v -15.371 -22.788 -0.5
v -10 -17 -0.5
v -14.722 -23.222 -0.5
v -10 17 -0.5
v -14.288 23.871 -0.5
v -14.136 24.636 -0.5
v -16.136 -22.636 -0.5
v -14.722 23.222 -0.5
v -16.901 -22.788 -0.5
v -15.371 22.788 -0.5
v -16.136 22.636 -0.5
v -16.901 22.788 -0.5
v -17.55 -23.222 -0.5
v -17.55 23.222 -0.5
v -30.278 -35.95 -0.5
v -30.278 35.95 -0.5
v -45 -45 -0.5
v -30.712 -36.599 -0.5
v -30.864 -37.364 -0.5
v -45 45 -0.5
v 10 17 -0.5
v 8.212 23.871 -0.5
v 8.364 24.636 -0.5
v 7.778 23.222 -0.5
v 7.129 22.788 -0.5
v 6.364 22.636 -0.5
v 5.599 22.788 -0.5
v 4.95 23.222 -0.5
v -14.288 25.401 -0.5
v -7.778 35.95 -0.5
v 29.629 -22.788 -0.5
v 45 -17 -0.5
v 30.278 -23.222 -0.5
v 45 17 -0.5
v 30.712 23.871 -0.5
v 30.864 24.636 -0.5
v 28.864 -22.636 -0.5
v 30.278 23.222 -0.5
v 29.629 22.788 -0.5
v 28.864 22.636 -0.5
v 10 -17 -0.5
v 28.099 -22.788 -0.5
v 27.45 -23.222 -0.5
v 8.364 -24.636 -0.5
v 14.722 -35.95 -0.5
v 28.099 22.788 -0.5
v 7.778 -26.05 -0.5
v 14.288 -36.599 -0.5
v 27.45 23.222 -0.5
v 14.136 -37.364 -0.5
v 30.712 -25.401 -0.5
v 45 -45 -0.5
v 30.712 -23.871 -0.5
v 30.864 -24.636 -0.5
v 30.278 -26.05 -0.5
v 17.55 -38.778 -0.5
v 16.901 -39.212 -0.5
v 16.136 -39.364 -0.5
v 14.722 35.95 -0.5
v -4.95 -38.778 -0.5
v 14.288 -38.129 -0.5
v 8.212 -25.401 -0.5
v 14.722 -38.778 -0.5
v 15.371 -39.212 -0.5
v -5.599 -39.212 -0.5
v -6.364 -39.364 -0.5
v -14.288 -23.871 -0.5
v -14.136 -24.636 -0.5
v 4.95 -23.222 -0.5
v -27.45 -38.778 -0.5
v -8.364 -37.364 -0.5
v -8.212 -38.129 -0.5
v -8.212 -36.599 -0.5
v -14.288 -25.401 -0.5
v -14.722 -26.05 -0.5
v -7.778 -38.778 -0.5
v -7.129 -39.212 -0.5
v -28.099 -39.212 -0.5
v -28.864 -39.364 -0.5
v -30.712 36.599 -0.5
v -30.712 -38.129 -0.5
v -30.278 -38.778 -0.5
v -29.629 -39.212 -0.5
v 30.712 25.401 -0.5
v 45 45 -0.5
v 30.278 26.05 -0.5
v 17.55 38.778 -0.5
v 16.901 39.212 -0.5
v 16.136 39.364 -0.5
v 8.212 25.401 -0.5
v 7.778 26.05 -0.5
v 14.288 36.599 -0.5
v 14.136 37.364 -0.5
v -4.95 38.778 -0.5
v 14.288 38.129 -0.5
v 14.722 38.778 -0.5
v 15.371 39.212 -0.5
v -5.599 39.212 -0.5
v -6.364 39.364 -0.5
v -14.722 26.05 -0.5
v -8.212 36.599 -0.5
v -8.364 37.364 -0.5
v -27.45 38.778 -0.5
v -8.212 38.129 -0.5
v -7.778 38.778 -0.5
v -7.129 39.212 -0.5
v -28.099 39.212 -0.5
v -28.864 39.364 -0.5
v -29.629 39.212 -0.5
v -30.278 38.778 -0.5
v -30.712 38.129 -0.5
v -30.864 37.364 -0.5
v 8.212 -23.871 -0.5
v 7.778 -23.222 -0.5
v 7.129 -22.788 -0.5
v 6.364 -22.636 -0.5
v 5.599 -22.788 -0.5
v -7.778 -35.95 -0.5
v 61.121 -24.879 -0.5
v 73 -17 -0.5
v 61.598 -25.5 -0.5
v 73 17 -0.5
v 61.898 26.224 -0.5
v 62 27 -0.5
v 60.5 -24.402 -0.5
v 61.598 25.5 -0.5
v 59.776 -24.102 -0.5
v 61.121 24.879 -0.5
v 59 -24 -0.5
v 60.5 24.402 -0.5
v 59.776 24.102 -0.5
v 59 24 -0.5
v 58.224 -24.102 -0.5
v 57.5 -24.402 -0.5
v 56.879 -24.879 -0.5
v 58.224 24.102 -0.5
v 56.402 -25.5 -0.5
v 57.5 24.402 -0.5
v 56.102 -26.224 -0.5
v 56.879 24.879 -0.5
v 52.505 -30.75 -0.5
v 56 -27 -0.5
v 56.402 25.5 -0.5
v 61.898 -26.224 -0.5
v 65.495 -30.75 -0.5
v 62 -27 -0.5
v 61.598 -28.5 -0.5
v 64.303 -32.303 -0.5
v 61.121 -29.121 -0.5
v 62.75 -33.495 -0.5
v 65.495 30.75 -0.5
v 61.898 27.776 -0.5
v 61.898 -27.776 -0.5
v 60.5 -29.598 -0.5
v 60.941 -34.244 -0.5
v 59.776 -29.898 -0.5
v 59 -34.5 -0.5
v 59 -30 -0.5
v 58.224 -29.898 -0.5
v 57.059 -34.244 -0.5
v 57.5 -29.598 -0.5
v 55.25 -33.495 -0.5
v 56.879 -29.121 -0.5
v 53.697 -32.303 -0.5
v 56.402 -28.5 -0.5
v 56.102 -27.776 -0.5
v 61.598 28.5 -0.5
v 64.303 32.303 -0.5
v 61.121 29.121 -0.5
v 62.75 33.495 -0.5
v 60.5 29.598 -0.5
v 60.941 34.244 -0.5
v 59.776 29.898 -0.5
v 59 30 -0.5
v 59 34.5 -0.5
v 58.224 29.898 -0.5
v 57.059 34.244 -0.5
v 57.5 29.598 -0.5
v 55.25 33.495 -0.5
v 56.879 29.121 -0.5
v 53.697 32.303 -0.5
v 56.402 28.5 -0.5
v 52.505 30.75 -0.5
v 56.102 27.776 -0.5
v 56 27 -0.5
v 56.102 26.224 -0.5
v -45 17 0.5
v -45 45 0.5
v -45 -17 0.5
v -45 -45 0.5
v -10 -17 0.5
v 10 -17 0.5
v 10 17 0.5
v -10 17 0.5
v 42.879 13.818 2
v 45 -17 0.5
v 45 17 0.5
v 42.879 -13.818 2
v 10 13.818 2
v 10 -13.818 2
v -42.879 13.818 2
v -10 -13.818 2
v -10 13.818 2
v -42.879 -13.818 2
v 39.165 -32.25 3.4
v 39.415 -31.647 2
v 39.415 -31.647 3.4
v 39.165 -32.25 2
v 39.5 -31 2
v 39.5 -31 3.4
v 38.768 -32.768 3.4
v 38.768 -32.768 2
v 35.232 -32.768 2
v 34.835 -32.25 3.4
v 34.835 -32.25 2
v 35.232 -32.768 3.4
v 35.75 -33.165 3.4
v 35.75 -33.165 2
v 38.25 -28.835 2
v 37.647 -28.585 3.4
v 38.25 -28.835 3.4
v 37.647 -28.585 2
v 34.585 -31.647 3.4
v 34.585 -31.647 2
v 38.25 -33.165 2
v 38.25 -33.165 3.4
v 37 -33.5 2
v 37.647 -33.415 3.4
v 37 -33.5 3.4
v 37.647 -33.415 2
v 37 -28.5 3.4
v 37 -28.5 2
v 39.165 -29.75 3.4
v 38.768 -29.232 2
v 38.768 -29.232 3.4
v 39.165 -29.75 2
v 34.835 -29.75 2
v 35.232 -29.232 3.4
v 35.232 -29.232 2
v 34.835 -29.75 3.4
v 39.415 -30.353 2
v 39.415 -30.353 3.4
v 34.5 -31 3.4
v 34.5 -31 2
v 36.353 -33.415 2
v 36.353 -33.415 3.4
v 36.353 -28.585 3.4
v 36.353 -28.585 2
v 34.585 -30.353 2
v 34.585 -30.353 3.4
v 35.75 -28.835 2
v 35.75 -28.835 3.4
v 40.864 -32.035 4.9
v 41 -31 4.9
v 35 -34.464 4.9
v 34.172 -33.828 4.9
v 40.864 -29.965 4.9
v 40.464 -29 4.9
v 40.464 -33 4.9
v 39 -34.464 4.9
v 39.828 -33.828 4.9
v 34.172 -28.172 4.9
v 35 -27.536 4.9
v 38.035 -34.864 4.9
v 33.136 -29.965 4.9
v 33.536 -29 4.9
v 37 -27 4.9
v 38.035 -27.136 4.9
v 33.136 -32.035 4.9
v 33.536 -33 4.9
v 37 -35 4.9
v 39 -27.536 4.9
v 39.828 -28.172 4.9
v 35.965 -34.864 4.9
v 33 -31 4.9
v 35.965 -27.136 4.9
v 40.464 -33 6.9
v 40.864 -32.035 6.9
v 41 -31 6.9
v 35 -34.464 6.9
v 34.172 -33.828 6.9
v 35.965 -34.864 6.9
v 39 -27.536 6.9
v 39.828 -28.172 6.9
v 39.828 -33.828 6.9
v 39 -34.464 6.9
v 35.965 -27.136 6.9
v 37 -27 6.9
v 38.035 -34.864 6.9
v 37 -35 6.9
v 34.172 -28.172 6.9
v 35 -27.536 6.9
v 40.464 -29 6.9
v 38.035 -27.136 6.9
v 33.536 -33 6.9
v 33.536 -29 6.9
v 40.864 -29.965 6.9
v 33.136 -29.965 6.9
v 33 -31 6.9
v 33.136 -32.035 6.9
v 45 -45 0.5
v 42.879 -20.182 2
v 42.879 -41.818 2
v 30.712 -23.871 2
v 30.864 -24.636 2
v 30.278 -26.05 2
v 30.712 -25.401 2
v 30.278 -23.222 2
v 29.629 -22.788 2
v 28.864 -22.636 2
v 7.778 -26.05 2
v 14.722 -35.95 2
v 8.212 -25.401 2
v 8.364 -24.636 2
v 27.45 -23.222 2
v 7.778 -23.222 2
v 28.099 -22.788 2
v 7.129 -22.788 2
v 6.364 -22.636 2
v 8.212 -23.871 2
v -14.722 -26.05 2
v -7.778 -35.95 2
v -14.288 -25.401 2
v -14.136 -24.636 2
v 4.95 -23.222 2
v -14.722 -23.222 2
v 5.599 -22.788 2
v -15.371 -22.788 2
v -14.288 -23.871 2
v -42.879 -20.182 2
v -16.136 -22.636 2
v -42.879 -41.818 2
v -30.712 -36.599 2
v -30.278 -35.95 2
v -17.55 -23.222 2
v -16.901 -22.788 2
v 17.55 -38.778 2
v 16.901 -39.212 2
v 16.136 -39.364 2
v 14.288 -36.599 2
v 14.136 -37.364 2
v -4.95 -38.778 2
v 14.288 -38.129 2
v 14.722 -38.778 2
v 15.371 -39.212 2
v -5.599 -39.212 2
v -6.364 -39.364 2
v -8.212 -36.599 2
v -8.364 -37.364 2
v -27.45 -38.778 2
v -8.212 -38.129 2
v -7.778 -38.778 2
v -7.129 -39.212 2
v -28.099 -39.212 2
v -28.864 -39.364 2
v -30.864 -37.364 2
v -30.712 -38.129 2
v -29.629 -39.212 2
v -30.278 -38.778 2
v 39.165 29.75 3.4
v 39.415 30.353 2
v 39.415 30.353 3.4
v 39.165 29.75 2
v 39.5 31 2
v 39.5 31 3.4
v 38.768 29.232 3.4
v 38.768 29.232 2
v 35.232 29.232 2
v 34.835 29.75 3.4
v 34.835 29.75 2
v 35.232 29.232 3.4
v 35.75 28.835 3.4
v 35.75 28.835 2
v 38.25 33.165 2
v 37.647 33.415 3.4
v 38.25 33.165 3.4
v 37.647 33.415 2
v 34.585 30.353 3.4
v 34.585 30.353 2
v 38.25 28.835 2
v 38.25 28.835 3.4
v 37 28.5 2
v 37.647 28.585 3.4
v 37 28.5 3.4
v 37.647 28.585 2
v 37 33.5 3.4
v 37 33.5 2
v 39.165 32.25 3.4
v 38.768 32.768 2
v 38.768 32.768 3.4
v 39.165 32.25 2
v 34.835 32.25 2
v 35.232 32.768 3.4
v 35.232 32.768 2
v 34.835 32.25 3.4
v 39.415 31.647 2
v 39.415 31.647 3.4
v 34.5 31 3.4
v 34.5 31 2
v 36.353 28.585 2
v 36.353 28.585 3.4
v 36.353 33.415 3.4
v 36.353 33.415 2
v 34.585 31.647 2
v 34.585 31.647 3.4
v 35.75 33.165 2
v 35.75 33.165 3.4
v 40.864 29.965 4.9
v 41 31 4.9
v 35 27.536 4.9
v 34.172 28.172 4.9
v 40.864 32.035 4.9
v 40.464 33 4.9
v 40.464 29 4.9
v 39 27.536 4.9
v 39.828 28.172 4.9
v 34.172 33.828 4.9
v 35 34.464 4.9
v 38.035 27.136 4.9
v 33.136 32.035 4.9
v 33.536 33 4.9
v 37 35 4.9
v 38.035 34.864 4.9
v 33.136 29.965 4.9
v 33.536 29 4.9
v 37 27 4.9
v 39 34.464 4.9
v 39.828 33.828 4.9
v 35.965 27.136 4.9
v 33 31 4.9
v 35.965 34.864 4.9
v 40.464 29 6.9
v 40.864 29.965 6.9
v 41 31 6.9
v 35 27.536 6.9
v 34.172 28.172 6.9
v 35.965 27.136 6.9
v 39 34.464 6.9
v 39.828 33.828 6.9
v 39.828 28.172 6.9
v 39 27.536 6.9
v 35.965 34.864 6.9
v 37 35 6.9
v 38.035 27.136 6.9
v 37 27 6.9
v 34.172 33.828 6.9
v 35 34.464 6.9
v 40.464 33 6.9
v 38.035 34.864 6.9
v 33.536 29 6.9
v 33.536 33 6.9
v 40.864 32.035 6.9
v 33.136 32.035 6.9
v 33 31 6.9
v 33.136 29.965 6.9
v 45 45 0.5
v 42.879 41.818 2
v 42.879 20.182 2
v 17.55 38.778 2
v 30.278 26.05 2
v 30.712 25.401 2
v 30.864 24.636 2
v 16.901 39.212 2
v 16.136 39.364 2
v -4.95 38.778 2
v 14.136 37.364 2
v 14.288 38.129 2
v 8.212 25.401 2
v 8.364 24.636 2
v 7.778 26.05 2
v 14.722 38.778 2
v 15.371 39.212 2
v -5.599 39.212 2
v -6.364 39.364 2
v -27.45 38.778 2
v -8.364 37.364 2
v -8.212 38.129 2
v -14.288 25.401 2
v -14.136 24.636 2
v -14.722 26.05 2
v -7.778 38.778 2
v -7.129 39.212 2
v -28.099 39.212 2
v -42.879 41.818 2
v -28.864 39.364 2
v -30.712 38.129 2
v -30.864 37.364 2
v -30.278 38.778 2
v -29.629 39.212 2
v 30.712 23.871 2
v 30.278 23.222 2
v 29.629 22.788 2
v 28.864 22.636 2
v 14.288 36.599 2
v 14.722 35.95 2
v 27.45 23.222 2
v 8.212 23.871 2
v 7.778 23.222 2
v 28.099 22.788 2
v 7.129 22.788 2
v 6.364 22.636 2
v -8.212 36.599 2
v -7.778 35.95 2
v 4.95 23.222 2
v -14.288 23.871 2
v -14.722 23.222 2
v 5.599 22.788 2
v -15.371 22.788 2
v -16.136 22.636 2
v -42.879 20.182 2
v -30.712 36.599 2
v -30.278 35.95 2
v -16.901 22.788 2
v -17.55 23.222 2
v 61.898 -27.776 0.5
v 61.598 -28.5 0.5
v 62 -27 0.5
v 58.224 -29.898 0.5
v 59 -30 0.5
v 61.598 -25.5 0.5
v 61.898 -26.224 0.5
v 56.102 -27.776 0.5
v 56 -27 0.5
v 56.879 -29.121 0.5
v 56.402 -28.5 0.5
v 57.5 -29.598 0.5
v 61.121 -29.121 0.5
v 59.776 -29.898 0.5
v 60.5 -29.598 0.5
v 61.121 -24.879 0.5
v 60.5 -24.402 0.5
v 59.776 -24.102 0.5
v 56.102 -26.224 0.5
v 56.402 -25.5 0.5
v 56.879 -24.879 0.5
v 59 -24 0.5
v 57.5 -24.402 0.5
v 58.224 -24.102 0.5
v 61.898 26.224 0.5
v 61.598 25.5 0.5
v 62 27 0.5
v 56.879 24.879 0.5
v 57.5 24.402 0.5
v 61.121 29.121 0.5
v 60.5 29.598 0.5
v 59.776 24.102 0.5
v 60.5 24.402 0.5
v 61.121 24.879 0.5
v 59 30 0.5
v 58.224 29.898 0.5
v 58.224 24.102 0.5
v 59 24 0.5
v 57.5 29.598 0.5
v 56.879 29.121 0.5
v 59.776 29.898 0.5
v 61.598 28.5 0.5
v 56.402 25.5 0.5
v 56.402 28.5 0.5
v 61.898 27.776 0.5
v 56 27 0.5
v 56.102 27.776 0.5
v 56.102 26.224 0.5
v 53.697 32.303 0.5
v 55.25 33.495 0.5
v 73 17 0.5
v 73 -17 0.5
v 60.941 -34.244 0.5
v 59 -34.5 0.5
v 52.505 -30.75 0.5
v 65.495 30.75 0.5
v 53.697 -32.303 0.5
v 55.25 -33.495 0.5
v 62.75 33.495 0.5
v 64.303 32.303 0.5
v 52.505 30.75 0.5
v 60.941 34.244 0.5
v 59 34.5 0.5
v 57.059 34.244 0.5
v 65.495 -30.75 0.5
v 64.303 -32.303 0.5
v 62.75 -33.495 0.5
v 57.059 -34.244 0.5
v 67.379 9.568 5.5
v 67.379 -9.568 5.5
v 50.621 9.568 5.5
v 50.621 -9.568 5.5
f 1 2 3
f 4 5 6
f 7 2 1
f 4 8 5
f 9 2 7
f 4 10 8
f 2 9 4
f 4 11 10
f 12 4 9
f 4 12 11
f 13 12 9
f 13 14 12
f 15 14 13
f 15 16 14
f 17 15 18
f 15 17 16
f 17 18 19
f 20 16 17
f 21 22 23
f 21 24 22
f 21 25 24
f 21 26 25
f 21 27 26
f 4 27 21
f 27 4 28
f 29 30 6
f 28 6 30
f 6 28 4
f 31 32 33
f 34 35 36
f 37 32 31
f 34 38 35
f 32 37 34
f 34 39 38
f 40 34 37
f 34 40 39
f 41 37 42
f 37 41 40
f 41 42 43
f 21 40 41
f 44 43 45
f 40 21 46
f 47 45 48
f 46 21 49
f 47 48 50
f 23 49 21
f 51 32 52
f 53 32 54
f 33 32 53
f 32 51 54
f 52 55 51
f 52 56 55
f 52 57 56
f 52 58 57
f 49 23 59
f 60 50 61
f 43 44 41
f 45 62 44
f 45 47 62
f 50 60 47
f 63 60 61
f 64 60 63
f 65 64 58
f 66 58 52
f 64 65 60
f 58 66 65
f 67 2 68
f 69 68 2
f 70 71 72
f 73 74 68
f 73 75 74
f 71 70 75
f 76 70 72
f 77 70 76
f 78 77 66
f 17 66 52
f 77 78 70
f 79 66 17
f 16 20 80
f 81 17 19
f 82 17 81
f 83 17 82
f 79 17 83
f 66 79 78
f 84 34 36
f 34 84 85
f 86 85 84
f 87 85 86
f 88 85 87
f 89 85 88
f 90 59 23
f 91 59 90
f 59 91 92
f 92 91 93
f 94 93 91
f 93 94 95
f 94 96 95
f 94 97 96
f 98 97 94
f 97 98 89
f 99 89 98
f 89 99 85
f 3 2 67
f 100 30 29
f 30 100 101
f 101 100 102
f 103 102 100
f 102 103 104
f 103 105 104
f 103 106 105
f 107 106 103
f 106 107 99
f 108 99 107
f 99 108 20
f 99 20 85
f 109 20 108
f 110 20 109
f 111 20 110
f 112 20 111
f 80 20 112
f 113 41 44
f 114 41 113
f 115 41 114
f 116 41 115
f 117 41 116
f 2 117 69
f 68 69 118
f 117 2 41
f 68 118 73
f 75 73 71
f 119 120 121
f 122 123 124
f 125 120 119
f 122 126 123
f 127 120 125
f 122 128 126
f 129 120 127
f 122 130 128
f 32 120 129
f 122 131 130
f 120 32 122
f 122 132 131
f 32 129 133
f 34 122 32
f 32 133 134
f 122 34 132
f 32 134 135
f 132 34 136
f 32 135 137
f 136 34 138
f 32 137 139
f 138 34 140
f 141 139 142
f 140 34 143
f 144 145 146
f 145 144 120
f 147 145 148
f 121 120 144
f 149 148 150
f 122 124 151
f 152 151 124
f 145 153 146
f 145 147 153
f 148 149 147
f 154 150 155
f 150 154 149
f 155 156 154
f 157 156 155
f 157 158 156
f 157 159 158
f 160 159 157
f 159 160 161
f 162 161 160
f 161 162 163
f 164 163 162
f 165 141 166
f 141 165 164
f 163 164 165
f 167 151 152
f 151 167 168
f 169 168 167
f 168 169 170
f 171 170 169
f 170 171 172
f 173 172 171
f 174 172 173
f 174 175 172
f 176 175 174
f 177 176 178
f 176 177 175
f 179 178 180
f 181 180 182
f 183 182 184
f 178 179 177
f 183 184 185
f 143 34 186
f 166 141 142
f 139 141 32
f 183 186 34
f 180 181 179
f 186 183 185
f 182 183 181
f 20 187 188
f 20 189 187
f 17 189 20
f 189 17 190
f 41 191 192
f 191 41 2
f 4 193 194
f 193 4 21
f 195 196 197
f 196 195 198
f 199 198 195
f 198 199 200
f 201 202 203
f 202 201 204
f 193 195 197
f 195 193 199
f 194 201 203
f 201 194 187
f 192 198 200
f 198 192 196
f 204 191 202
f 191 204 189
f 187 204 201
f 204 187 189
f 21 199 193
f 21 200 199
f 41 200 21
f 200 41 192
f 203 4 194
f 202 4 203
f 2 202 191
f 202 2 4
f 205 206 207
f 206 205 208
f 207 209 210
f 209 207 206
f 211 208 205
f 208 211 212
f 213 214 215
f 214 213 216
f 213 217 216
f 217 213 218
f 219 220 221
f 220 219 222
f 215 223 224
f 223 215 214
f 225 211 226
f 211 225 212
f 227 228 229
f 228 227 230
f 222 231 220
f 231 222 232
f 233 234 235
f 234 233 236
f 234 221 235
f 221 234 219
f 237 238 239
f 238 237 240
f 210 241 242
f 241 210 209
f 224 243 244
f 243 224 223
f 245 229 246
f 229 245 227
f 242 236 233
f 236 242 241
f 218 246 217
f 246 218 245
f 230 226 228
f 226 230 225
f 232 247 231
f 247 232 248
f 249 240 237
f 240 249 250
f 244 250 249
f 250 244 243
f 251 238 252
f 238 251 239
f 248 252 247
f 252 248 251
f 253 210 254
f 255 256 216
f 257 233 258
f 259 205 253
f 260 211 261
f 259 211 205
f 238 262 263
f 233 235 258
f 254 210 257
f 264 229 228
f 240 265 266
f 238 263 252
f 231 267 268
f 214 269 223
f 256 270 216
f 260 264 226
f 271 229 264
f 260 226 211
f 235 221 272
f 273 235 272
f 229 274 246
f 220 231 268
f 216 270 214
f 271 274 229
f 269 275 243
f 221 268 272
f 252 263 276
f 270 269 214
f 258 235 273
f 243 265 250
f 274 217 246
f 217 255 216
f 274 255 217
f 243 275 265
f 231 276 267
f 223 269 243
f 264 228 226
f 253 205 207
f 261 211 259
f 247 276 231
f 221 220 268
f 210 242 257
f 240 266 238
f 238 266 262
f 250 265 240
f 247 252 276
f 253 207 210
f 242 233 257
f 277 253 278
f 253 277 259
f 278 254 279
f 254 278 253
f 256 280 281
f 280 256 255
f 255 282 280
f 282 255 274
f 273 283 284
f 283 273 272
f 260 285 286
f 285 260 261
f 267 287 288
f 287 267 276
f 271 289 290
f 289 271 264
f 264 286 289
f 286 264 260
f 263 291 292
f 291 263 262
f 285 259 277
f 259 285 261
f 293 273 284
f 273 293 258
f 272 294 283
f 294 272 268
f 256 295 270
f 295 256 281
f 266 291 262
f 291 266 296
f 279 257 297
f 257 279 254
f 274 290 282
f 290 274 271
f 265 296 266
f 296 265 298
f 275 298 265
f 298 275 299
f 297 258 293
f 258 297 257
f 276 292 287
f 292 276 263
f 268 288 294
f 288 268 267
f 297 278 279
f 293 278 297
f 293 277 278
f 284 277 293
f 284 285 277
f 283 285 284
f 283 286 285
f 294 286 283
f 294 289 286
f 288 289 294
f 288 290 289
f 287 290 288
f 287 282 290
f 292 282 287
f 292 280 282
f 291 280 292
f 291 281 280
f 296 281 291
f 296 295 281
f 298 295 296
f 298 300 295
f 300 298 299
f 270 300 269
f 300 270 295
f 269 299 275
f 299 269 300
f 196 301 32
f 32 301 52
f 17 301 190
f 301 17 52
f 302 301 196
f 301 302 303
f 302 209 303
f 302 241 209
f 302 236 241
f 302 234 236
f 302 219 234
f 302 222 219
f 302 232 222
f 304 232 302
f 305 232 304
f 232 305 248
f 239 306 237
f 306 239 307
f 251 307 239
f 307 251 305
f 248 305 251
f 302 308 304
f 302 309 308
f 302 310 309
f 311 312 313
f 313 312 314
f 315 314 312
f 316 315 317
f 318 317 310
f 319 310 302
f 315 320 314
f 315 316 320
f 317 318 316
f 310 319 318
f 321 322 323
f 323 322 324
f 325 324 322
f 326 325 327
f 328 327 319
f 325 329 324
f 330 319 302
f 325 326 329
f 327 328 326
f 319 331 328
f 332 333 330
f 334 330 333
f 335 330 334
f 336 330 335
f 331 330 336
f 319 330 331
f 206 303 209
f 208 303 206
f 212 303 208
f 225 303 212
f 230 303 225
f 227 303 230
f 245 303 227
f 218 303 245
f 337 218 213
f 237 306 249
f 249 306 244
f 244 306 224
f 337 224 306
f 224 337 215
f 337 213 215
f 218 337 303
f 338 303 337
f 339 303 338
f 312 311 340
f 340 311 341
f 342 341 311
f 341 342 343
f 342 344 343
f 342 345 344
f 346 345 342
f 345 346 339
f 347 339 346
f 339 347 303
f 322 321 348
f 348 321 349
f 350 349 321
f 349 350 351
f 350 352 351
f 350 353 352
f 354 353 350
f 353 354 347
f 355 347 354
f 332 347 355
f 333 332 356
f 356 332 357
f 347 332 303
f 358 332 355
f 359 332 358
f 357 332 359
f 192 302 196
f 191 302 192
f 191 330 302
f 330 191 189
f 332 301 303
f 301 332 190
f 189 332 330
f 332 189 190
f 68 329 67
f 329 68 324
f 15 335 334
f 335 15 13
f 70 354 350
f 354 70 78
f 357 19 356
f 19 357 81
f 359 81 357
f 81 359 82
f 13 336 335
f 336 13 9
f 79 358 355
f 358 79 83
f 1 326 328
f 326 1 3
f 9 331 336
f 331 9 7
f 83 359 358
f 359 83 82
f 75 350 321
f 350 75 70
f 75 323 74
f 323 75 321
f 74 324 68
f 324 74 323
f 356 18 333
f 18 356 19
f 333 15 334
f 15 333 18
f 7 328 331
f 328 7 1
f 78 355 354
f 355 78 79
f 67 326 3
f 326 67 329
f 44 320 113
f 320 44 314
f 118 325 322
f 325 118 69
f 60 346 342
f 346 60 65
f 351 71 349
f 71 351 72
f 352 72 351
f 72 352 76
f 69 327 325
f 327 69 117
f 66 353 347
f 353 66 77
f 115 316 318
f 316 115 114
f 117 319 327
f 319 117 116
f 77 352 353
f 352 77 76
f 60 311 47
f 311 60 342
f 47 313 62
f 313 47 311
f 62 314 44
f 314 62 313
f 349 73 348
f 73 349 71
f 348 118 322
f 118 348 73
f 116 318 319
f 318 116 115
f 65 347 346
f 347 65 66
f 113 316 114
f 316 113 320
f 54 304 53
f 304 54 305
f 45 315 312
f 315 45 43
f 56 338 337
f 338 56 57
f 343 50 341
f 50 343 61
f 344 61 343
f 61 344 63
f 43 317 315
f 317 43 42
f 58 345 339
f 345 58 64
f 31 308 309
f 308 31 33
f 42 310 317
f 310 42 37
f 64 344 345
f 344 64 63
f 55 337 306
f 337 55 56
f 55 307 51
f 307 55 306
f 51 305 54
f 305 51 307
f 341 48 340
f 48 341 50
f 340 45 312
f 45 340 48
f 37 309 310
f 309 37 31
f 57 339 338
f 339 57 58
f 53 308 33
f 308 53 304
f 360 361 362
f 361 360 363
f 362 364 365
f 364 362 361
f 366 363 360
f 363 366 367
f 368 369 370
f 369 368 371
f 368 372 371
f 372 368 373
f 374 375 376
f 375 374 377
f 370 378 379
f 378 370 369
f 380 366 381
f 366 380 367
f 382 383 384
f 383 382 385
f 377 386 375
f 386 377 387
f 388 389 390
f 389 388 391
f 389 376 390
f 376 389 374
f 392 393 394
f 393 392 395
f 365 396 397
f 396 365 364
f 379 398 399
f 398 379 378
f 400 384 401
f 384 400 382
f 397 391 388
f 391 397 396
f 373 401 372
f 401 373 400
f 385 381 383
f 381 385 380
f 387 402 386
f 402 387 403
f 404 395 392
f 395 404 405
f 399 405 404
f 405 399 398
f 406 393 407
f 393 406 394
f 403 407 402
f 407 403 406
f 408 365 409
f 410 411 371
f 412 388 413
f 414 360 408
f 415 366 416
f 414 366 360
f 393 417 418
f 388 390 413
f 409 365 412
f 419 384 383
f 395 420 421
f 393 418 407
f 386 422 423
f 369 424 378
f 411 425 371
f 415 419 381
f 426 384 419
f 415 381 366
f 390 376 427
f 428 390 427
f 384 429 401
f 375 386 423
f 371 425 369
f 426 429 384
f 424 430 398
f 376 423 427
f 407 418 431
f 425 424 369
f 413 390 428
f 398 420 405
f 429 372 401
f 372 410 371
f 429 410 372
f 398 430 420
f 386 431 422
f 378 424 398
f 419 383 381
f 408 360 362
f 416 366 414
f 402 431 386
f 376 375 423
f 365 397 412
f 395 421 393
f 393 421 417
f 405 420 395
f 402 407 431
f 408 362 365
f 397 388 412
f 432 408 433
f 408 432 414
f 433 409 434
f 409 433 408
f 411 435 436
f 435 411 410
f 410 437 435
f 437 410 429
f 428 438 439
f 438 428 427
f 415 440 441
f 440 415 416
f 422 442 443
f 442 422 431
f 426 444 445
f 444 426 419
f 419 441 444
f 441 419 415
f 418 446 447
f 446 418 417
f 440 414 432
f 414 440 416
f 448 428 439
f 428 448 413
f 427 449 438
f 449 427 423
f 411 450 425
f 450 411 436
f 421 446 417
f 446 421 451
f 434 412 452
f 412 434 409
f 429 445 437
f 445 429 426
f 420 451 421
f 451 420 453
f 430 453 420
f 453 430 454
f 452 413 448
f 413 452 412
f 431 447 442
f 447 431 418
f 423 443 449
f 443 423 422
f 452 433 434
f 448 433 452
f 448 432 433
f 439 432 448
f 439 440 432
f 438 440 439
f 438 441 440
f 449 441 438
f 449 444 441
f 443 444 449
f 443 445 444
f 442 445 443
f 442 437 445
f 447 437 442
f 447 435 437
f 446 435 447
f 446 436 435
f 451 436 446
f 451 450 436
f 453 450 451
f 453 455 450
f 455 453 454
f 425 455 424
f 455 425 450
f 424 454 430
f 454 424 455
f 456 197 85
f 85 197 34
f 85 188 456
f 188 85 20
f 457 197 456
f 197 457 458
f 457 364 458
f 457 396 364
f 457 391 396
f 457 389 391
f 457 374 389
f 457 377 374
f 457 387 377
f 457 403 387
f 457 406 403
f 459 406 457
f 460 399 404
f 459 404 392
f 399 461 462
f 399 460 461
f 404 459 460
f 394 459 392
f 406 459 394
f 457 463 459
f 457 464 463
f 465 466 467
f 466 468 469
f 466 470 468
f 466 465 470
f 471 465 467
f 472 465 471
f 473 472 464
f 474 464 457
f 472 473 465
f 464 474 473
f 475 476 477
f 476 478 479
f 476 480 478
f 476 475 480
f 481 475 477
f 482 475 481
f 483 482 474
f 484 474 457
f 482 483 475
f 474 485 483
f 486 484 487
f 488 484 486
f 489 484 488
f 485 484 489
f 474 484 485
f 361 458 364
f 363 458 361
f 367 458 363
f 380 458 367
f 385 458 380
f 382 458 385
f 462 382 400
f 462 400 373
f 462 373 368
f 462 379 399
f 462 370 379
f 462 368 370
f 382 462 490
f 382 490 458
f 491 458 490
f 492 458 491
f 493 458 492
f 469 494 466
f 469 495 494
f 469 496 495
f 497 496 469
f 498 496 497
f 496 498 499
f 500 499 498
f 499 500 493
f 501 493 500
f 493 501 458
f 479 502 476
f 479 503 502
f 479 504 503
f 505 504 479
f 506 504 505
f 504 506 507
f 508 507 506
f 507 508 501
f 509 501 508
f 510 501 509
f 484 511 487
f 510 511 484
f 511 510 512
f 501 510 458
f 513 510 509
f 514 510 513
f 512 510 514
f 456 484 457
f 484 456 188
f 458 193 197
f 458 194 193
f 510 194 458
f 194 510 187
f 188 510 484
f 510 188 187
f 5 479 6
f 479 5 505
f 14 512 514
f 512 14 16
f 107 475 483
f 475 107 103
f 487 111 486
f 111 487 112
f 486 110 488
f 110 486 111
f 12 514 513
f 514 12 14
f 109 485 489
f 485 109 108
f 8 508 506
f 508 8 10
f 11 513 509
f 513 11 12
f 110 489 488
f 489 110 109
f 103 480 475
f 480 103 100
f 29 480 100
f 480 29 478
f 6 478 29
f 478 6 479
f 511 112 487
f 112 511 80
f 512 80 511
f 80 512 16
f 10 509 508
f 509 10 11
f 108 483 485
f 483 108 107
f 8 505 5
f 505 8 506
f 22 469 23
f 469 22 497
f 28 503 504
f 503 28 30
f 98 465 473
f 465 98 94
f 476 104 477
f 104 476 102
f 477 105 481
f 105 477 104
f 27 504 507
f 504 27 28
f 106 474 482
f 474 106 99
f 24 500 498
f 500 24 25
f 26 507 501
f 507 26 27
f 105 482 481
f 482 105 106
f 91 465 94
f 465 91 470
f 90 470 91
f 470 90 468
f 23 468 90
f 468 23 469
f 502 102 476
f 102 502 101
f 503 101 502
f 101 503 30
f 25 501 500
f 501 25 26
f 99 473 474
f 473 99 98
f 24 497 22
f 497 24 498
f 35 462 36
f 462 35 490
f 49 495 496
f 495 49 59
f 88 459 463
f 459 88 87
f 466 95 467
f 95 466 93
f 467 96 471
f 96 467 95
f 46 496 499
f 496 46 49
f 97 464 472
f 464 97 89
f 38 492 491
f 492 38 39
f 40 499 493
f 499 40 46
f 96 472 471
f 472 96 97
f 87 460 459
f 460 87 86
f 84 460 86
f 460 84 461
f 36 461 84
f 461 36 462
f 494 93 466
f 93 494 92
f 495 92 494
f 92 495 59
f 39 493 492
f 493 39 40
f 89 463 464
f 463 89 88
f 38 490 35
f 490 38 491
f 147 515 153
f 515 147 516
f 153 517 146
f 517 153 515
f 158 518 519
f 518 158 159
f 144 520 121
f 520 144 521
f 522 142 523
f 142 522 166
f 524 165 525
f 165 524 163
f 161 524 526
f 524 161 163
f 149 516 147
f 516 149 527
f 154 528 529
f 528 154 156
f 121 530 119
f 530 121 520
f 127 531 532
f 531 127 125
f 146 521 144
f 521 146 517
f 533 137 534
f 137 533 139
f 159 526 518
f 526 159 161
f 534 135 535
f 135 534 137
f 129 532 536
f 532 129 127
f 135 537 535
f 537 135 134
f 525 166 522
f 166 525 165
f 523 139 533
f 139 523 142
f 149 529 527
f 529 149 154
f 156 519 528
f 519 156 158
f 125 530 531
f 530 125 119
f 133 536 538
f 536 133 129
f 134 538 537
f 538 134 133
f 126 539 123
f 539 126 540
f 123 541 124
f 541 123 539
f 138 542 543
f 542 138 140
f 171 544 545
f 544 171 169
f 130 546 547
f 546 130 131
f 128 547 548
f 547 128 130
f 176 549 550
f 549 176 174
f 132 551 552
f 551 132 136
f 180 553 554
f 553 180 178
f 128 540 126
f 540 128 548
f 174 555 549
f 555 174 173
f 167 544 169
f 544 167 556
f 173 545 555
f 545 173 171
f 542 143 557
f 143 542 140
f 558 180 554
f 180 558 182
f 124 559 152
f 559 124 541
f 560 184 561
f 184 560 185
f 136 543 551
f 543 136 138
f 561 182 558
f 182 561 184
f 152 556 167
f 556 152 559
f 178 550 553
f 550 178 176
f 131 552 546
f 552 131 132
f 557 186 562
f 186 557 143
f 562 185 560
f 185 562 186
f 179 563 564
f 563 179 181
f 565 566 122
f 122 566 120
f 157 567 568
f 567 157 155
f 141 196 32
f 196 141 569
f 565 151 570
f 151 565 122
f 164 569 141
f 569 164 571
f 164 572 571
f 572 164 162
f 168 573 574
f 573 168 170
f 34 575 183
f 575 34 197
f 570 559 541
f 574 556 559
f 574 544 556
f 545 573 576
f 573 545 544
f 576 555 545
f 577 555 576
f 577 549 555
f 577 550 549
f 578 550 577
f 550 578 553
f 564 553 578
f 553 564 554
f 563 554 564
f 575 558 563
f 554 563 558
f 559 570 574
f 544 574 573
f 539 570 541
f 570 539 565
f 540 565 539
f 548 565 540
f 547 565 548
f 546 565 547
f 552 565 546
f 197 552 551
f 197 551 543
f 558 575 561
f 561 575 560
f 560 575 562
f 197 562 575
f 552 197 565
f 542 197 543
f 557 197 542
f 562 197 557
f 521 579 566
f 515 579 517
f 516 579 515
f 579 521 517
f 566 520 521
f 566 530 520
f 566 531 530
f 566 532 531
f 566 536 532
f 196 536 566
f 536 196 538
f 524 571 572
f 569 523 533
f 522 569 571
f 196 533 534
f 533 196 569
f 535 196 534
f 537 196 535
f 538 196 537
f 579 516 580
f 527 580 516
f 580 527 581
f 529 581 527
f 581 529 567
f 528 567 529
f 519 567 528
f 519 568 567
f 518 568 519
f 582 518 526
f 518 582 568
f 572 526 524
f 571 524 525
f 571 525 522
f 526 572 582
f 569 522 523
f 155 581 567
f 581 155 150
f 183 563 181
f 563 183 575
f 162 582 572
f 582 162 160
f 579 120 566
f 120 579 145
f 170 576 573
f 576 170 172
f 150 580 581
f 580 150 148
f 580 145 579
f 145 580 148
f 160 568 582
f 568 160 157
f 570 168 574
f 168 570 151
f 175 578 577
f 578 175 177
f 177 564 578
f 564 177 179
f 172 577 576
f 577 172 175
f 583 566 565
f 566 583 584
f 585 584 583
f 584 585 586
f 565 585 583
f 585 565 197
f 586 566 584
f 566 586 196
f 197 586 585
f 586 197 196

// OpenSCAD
/* [Battery Dimensions] */
//The width of your battery in mm, determines the width of the center section.
batteryWidth = 34; //[20:150]
//The length of your battery in mm, determines the length of the PackWrap.
batteryLength = 90; //[20:300]
//The depth of your battery in mm, determines the width of the side sections.
batteryDepth = 28; //[20:150]

/* [Strap Options] */
//Larger batteries may require more straps.
strapCount = 1; //[0,1,2,3]
//Width of your battery strap in mm, determines the size of the space in the center section.
strapWidth = 20; //[0:40]
//Determines the distance between straps if using more than one.
strapSeperation = 20; //[5:200]
//Offsets the center of the strap(s) in mm.
strapCenterOffset = 0; //[-300:300]


/* [PackWrap Specs] */
//Determines how thick to print the walls in mm (in addition to the base thickness below).
wallThickness = 1.5; //[0:0.1:3]
//Thickness of the base in mm, determines tab and joint thickness.  Probably does not need to be changed if printing with TPU.
baseThickness = 1; //[0.5:0.1:3]
//Determines thicknes of the front "bumper" in mm.
bumperThickness = 5; //[0:15]



/* [Additional Options] */
//You can choose to add a strap to the rear for wire and battery retention, slots to use a second battery strap, or leave the rear open.
rearOption = "None"; //[None,Strap,Slots]
//Larger batteries may require additional tabs for the PackWrap to hold its shape.
tabCount = 1; //[1,2]









module stripe(){
    rotate([0,0,45]){
        translate([0,-batteryDepth/2+5,0]){
            hull(){
                cylinder(h=wallThickness+baseThickness*4, d=4, center=true, $fn=16);
                translate([0,batteryDepth-10,0]){
                    cylinder(h=wallThickness+baseThickness*4, d=4, center=true, $fn=16);
                }
            }
        }
    }
}

module stripes(){
    stripeClearance = (batteryDepth/sqrt(2))/2+8;
    stripeCount = floor((batteryLength-15)/stripeClearance);
    stripeOffset = batteryLength/stripeCount;
    echo (stripeCount);
    
    translate([-(batteryLength)/2,0,0]){
        for(i=[1:1:stripeCount-1]){
            translate([stripeOffset*i,0,0]){
                stripe();
            }
        }
    }
}



module strapTab(){
    tabHeight = baseThickness+0.4;
    translate([0,0,-(tabHeight)]){   
        cylinder(h=tabHeight, d=5, $fn=24);
    }
    translate([0,0,-(tabHeight+1.5)]){
        cylinder(h=1.5, d1=8, d2=5, $fn=24);
    }
    translate([0,0,-(tabHeight+3.5)]){
        cylinder(h=2, d=8, $fn=24);
    }
}


rotate([180,0,0]){
//center
difference(){
translate([0,0,0]){

    cube([batteryLength, batteryWidth, baseThickness], true);
    translate([0,0,-baseThickness/2]){
        hull(){
            cube([batteryLength, batteryWidth, 0.0001], true);

            translate([0,0,-wallThickness]){
                cube([batteryLength-(wallThickness*sqrt(2)*2), batteryWidth-wallThickness*(wallThickness*sqrt(2)*2), 0.0001], true);
            }
        }
    } 
}
if(strapCount>0){
    if(strapCount==1){
        translate([strapCenterOffset,0,0]){
            cube([strapWidth, batteryWidth, batteryWidth+wallThickness+5], true);
        }
    }else if(strapCount==2){
        translate([strapCenterOffset+(strapWidth/2)+(strapSeperation/2),0,0]){
            cube([strapWidth, batteryWidth, batteryWidth+wallThickness+5], true);
        }
        translate([strapCenterOffset-(strapWidth/2)-(strapSeperation/2),0,0]){
            cube([strapWidth, batteryWidth, batteryWidth+wallThickness+5], true);
        }
    }else if(strapCount==3){
        translate([strapCenterOffset+strapWidth+(strapSeperation),0,0]){
            cube([strapWidth, batteryWidth, batteryWidth+wallThickness+5], true);
        }
        translate([strapCenterOffset,0,0]){
            cube([strapWidth, batteryWidth, batteryWidth+wallThickness+5], true);
        }
        translate([strapCenterOffset-strapWidth-(strapSeperation),0,0]){
            cube([strapWidth, batteryWidth, batteryWidth+wallThickness+5], true);
        }
    }
}
}
 
//right
difference(){
    translate([0,batteryWidth/2+batteryDepth/2,0]){
        cube([batteryLength, batteryDepth, baseThickness], true);
        
        translate([0,0,-baseThickness/2]){
            hull(){
                cube([batteryLength, batteryDepth, 0.0001], true);
                translate([0,0,-wallThickness]){
                    cube([batteryLength-(wallThickness*sqrt(2)*2), batteryDepth-wallThickness*(wallThickness*sqrt(2)*2), 0.0001], true);
                }
            }
        }
            
        if(rearOption == "Strap"){
            translate([-batteryLength/2+8,0,-(baseThickness/2+wallThickness)]){
                strapTab();
            }
        }
            
            
            
        if(tabCount == 1){
            translate([batteryLength/2-8,0,-(baseThickness/2+wallThickness)]){
                strapTab();
            }
        }else if(tabCount == 2){
            translate([batteryLength/2-8,batteryDepth/5,-(baseThickness/2+wallThickness)]){
                strapTab();
            }
            translate([batteryLength/2-8,-batteryDepth/5,-(baseThickness/2+wallThickness)]){
                strapTab();
            }
        }
    }
    translate([0,batteryWidth/2+batteryDepth/2,0]){stripes();}
    
    if(rearOption == "Slots"){
        translate([-batteryLength/2+5,batteryWidth/2+batteryDepth/2-strapWidth/2,-5]){cube([3,strapWidth,10]);}
    }
}

//left
difference(){
    translate([0,-batteryWidth/2-batteryDepth/2,0]){
        cube([batteryLength, batteryDepth, baseThickness], true);
            translate([0,0,-baseThickness/2]){
                hull(){
                    cube([batteryLength, batteryDepth, 0.0001], true);
                    translate([0,0,-wallThickness]){
                        cube([batteryLength-(wallThickness*sqrt(2)*2), batteryDepth-wallThickness*(wallThickness*sqrt(2)*2), 0.0001], true);
                    }
                }
            }
    
            if(tabCount == 1){
                translate([batteryLength/2-8,0,-(baseThickness/2+wallThickness)]){
                    strapTab();
                }
            }else if(tabCount == 2){
                translate([batteryLength/2-8,batteryDepth/5,-(baseThickness/2+wallThickness)]){
                    strapTab();
                }
            translate([batteryLength/2-8,-batteryDepth/5,-(baseThickness/2+wallThickness)]){
                strapTab();
            }
        }
    }
    translate([0,-(batteryWidth/2+batteryDepth/2),0]){
        rotate([180,0,0]){
            stripes();
        }
    }
   
if(rearOption == "Slots"){
        translate([-batteryLength/2+5,-batteryWidth/2-batteryDepth/2-strapWidth/2,-5]){cube([3,strapWidth,10]);}
    } 
}

if(rearOption == "Strap"){
    translate([-batteryLength/2-batteryWidth-8,-batteryWidth/2-batteryDepth/2-6,-baseThickness/2]){
        difference(){
            hull(){
                cube([batteryWidth+8, 12,baseThickness]);
                translate([0,6,0])cylinder(h=baseThickness, d=12, $fn=24);
            }
            translate([0,6,-1])cylinder(h=baseThickness+2, d=6, $fn=24);
        }
    }
}


//top/bumper
translate([batteryLength/2+batteryDepth/2,0,0]){
    difference(){
        hull(){
            cube([batteryDepth, batteryWidth, baseThickness], true);
            if(tabCount == 1){
                translate([0, batteryWidth/2+10, 0]){
                    cylinder(h=baseThickness, d=15, $fn=24, center=true);
                }
                translate([0, -(batteryWidth/2+10), 0]){
                    cylinder(h=baseThickness, d=15, $fn=24, center=true);
                }
            }else if(tabCount == 2){
                translate([batteryDepth/5, batteryWidth/2+10, 0]){
                    cylinder(h=baseThickness, d=15, $fn=24, center=true);
                }
                translate([-batteryDepth/5, batteryWidth/2+10, 0]){
                    cylinder(h=baseThickness, d=15, $fn=24, center=true);
                }
                translate([batteryDepth/5, -(batteryWidth/2+10), 0]){
                    cylinder(h=baseThickness, d=15, $fn=24, center=true);
                }
                translate([-batteryDepth/5, -(batteryWidth/2+10), 0]){
                    cylinder(h=baseThickness, d=15, $fn=24, center=true);
                }
            }
        }
        if(tabCount == 1){
            translate([0, batteryWidth/2+10, 0]){
                cylinder(h=baseThickness+1, d=6, $fn=24, center=true);
            }
            translate([0, -(batteryWidth/2+10), 0]){
                cylinder(h=baseThickness+1, d=6, $fn=24, center=true);
            }
        }else if (tabCount == 2){
            translate([batteryDepth/5, batteryWidth/2+10, 0]){
                cylinder(h=baseThickness+1, d=6, $fn=24, center=true);
            }
            translate([-batteryDepth/5, batteryWidth/2+10, 0]){
                cylinder(h=baseThickness+1, d=6, $fn=24, center=true);
            }
            translate([batteryDepth/5, -(batteryWidth/2+10), 0]){
                cylinder(h=baseThickness+1, d=6, $fn=24, center=true);
            }
            translate([-batteryDepth/5, -(batteryWidth/2+10), 0]){
                cylinder(h=baseThickness+1, d=6, $fn=24, center=true);
            }
        }
    }
    
    translate([0,0,-baseThickness/2]){
        hull(){
            cube([batteryDepth, batteryWidth, 0.0001], true);

            translate([0,0,-bumperThickness]){
                cube([batteryDepth*.75-(wallThickness*sqrt(2)*2), batteryWidth*.75-wallThickness*(wallThickness*sqrt(2)*2), 0.0001], true);
            }
        }
    }
}
}
